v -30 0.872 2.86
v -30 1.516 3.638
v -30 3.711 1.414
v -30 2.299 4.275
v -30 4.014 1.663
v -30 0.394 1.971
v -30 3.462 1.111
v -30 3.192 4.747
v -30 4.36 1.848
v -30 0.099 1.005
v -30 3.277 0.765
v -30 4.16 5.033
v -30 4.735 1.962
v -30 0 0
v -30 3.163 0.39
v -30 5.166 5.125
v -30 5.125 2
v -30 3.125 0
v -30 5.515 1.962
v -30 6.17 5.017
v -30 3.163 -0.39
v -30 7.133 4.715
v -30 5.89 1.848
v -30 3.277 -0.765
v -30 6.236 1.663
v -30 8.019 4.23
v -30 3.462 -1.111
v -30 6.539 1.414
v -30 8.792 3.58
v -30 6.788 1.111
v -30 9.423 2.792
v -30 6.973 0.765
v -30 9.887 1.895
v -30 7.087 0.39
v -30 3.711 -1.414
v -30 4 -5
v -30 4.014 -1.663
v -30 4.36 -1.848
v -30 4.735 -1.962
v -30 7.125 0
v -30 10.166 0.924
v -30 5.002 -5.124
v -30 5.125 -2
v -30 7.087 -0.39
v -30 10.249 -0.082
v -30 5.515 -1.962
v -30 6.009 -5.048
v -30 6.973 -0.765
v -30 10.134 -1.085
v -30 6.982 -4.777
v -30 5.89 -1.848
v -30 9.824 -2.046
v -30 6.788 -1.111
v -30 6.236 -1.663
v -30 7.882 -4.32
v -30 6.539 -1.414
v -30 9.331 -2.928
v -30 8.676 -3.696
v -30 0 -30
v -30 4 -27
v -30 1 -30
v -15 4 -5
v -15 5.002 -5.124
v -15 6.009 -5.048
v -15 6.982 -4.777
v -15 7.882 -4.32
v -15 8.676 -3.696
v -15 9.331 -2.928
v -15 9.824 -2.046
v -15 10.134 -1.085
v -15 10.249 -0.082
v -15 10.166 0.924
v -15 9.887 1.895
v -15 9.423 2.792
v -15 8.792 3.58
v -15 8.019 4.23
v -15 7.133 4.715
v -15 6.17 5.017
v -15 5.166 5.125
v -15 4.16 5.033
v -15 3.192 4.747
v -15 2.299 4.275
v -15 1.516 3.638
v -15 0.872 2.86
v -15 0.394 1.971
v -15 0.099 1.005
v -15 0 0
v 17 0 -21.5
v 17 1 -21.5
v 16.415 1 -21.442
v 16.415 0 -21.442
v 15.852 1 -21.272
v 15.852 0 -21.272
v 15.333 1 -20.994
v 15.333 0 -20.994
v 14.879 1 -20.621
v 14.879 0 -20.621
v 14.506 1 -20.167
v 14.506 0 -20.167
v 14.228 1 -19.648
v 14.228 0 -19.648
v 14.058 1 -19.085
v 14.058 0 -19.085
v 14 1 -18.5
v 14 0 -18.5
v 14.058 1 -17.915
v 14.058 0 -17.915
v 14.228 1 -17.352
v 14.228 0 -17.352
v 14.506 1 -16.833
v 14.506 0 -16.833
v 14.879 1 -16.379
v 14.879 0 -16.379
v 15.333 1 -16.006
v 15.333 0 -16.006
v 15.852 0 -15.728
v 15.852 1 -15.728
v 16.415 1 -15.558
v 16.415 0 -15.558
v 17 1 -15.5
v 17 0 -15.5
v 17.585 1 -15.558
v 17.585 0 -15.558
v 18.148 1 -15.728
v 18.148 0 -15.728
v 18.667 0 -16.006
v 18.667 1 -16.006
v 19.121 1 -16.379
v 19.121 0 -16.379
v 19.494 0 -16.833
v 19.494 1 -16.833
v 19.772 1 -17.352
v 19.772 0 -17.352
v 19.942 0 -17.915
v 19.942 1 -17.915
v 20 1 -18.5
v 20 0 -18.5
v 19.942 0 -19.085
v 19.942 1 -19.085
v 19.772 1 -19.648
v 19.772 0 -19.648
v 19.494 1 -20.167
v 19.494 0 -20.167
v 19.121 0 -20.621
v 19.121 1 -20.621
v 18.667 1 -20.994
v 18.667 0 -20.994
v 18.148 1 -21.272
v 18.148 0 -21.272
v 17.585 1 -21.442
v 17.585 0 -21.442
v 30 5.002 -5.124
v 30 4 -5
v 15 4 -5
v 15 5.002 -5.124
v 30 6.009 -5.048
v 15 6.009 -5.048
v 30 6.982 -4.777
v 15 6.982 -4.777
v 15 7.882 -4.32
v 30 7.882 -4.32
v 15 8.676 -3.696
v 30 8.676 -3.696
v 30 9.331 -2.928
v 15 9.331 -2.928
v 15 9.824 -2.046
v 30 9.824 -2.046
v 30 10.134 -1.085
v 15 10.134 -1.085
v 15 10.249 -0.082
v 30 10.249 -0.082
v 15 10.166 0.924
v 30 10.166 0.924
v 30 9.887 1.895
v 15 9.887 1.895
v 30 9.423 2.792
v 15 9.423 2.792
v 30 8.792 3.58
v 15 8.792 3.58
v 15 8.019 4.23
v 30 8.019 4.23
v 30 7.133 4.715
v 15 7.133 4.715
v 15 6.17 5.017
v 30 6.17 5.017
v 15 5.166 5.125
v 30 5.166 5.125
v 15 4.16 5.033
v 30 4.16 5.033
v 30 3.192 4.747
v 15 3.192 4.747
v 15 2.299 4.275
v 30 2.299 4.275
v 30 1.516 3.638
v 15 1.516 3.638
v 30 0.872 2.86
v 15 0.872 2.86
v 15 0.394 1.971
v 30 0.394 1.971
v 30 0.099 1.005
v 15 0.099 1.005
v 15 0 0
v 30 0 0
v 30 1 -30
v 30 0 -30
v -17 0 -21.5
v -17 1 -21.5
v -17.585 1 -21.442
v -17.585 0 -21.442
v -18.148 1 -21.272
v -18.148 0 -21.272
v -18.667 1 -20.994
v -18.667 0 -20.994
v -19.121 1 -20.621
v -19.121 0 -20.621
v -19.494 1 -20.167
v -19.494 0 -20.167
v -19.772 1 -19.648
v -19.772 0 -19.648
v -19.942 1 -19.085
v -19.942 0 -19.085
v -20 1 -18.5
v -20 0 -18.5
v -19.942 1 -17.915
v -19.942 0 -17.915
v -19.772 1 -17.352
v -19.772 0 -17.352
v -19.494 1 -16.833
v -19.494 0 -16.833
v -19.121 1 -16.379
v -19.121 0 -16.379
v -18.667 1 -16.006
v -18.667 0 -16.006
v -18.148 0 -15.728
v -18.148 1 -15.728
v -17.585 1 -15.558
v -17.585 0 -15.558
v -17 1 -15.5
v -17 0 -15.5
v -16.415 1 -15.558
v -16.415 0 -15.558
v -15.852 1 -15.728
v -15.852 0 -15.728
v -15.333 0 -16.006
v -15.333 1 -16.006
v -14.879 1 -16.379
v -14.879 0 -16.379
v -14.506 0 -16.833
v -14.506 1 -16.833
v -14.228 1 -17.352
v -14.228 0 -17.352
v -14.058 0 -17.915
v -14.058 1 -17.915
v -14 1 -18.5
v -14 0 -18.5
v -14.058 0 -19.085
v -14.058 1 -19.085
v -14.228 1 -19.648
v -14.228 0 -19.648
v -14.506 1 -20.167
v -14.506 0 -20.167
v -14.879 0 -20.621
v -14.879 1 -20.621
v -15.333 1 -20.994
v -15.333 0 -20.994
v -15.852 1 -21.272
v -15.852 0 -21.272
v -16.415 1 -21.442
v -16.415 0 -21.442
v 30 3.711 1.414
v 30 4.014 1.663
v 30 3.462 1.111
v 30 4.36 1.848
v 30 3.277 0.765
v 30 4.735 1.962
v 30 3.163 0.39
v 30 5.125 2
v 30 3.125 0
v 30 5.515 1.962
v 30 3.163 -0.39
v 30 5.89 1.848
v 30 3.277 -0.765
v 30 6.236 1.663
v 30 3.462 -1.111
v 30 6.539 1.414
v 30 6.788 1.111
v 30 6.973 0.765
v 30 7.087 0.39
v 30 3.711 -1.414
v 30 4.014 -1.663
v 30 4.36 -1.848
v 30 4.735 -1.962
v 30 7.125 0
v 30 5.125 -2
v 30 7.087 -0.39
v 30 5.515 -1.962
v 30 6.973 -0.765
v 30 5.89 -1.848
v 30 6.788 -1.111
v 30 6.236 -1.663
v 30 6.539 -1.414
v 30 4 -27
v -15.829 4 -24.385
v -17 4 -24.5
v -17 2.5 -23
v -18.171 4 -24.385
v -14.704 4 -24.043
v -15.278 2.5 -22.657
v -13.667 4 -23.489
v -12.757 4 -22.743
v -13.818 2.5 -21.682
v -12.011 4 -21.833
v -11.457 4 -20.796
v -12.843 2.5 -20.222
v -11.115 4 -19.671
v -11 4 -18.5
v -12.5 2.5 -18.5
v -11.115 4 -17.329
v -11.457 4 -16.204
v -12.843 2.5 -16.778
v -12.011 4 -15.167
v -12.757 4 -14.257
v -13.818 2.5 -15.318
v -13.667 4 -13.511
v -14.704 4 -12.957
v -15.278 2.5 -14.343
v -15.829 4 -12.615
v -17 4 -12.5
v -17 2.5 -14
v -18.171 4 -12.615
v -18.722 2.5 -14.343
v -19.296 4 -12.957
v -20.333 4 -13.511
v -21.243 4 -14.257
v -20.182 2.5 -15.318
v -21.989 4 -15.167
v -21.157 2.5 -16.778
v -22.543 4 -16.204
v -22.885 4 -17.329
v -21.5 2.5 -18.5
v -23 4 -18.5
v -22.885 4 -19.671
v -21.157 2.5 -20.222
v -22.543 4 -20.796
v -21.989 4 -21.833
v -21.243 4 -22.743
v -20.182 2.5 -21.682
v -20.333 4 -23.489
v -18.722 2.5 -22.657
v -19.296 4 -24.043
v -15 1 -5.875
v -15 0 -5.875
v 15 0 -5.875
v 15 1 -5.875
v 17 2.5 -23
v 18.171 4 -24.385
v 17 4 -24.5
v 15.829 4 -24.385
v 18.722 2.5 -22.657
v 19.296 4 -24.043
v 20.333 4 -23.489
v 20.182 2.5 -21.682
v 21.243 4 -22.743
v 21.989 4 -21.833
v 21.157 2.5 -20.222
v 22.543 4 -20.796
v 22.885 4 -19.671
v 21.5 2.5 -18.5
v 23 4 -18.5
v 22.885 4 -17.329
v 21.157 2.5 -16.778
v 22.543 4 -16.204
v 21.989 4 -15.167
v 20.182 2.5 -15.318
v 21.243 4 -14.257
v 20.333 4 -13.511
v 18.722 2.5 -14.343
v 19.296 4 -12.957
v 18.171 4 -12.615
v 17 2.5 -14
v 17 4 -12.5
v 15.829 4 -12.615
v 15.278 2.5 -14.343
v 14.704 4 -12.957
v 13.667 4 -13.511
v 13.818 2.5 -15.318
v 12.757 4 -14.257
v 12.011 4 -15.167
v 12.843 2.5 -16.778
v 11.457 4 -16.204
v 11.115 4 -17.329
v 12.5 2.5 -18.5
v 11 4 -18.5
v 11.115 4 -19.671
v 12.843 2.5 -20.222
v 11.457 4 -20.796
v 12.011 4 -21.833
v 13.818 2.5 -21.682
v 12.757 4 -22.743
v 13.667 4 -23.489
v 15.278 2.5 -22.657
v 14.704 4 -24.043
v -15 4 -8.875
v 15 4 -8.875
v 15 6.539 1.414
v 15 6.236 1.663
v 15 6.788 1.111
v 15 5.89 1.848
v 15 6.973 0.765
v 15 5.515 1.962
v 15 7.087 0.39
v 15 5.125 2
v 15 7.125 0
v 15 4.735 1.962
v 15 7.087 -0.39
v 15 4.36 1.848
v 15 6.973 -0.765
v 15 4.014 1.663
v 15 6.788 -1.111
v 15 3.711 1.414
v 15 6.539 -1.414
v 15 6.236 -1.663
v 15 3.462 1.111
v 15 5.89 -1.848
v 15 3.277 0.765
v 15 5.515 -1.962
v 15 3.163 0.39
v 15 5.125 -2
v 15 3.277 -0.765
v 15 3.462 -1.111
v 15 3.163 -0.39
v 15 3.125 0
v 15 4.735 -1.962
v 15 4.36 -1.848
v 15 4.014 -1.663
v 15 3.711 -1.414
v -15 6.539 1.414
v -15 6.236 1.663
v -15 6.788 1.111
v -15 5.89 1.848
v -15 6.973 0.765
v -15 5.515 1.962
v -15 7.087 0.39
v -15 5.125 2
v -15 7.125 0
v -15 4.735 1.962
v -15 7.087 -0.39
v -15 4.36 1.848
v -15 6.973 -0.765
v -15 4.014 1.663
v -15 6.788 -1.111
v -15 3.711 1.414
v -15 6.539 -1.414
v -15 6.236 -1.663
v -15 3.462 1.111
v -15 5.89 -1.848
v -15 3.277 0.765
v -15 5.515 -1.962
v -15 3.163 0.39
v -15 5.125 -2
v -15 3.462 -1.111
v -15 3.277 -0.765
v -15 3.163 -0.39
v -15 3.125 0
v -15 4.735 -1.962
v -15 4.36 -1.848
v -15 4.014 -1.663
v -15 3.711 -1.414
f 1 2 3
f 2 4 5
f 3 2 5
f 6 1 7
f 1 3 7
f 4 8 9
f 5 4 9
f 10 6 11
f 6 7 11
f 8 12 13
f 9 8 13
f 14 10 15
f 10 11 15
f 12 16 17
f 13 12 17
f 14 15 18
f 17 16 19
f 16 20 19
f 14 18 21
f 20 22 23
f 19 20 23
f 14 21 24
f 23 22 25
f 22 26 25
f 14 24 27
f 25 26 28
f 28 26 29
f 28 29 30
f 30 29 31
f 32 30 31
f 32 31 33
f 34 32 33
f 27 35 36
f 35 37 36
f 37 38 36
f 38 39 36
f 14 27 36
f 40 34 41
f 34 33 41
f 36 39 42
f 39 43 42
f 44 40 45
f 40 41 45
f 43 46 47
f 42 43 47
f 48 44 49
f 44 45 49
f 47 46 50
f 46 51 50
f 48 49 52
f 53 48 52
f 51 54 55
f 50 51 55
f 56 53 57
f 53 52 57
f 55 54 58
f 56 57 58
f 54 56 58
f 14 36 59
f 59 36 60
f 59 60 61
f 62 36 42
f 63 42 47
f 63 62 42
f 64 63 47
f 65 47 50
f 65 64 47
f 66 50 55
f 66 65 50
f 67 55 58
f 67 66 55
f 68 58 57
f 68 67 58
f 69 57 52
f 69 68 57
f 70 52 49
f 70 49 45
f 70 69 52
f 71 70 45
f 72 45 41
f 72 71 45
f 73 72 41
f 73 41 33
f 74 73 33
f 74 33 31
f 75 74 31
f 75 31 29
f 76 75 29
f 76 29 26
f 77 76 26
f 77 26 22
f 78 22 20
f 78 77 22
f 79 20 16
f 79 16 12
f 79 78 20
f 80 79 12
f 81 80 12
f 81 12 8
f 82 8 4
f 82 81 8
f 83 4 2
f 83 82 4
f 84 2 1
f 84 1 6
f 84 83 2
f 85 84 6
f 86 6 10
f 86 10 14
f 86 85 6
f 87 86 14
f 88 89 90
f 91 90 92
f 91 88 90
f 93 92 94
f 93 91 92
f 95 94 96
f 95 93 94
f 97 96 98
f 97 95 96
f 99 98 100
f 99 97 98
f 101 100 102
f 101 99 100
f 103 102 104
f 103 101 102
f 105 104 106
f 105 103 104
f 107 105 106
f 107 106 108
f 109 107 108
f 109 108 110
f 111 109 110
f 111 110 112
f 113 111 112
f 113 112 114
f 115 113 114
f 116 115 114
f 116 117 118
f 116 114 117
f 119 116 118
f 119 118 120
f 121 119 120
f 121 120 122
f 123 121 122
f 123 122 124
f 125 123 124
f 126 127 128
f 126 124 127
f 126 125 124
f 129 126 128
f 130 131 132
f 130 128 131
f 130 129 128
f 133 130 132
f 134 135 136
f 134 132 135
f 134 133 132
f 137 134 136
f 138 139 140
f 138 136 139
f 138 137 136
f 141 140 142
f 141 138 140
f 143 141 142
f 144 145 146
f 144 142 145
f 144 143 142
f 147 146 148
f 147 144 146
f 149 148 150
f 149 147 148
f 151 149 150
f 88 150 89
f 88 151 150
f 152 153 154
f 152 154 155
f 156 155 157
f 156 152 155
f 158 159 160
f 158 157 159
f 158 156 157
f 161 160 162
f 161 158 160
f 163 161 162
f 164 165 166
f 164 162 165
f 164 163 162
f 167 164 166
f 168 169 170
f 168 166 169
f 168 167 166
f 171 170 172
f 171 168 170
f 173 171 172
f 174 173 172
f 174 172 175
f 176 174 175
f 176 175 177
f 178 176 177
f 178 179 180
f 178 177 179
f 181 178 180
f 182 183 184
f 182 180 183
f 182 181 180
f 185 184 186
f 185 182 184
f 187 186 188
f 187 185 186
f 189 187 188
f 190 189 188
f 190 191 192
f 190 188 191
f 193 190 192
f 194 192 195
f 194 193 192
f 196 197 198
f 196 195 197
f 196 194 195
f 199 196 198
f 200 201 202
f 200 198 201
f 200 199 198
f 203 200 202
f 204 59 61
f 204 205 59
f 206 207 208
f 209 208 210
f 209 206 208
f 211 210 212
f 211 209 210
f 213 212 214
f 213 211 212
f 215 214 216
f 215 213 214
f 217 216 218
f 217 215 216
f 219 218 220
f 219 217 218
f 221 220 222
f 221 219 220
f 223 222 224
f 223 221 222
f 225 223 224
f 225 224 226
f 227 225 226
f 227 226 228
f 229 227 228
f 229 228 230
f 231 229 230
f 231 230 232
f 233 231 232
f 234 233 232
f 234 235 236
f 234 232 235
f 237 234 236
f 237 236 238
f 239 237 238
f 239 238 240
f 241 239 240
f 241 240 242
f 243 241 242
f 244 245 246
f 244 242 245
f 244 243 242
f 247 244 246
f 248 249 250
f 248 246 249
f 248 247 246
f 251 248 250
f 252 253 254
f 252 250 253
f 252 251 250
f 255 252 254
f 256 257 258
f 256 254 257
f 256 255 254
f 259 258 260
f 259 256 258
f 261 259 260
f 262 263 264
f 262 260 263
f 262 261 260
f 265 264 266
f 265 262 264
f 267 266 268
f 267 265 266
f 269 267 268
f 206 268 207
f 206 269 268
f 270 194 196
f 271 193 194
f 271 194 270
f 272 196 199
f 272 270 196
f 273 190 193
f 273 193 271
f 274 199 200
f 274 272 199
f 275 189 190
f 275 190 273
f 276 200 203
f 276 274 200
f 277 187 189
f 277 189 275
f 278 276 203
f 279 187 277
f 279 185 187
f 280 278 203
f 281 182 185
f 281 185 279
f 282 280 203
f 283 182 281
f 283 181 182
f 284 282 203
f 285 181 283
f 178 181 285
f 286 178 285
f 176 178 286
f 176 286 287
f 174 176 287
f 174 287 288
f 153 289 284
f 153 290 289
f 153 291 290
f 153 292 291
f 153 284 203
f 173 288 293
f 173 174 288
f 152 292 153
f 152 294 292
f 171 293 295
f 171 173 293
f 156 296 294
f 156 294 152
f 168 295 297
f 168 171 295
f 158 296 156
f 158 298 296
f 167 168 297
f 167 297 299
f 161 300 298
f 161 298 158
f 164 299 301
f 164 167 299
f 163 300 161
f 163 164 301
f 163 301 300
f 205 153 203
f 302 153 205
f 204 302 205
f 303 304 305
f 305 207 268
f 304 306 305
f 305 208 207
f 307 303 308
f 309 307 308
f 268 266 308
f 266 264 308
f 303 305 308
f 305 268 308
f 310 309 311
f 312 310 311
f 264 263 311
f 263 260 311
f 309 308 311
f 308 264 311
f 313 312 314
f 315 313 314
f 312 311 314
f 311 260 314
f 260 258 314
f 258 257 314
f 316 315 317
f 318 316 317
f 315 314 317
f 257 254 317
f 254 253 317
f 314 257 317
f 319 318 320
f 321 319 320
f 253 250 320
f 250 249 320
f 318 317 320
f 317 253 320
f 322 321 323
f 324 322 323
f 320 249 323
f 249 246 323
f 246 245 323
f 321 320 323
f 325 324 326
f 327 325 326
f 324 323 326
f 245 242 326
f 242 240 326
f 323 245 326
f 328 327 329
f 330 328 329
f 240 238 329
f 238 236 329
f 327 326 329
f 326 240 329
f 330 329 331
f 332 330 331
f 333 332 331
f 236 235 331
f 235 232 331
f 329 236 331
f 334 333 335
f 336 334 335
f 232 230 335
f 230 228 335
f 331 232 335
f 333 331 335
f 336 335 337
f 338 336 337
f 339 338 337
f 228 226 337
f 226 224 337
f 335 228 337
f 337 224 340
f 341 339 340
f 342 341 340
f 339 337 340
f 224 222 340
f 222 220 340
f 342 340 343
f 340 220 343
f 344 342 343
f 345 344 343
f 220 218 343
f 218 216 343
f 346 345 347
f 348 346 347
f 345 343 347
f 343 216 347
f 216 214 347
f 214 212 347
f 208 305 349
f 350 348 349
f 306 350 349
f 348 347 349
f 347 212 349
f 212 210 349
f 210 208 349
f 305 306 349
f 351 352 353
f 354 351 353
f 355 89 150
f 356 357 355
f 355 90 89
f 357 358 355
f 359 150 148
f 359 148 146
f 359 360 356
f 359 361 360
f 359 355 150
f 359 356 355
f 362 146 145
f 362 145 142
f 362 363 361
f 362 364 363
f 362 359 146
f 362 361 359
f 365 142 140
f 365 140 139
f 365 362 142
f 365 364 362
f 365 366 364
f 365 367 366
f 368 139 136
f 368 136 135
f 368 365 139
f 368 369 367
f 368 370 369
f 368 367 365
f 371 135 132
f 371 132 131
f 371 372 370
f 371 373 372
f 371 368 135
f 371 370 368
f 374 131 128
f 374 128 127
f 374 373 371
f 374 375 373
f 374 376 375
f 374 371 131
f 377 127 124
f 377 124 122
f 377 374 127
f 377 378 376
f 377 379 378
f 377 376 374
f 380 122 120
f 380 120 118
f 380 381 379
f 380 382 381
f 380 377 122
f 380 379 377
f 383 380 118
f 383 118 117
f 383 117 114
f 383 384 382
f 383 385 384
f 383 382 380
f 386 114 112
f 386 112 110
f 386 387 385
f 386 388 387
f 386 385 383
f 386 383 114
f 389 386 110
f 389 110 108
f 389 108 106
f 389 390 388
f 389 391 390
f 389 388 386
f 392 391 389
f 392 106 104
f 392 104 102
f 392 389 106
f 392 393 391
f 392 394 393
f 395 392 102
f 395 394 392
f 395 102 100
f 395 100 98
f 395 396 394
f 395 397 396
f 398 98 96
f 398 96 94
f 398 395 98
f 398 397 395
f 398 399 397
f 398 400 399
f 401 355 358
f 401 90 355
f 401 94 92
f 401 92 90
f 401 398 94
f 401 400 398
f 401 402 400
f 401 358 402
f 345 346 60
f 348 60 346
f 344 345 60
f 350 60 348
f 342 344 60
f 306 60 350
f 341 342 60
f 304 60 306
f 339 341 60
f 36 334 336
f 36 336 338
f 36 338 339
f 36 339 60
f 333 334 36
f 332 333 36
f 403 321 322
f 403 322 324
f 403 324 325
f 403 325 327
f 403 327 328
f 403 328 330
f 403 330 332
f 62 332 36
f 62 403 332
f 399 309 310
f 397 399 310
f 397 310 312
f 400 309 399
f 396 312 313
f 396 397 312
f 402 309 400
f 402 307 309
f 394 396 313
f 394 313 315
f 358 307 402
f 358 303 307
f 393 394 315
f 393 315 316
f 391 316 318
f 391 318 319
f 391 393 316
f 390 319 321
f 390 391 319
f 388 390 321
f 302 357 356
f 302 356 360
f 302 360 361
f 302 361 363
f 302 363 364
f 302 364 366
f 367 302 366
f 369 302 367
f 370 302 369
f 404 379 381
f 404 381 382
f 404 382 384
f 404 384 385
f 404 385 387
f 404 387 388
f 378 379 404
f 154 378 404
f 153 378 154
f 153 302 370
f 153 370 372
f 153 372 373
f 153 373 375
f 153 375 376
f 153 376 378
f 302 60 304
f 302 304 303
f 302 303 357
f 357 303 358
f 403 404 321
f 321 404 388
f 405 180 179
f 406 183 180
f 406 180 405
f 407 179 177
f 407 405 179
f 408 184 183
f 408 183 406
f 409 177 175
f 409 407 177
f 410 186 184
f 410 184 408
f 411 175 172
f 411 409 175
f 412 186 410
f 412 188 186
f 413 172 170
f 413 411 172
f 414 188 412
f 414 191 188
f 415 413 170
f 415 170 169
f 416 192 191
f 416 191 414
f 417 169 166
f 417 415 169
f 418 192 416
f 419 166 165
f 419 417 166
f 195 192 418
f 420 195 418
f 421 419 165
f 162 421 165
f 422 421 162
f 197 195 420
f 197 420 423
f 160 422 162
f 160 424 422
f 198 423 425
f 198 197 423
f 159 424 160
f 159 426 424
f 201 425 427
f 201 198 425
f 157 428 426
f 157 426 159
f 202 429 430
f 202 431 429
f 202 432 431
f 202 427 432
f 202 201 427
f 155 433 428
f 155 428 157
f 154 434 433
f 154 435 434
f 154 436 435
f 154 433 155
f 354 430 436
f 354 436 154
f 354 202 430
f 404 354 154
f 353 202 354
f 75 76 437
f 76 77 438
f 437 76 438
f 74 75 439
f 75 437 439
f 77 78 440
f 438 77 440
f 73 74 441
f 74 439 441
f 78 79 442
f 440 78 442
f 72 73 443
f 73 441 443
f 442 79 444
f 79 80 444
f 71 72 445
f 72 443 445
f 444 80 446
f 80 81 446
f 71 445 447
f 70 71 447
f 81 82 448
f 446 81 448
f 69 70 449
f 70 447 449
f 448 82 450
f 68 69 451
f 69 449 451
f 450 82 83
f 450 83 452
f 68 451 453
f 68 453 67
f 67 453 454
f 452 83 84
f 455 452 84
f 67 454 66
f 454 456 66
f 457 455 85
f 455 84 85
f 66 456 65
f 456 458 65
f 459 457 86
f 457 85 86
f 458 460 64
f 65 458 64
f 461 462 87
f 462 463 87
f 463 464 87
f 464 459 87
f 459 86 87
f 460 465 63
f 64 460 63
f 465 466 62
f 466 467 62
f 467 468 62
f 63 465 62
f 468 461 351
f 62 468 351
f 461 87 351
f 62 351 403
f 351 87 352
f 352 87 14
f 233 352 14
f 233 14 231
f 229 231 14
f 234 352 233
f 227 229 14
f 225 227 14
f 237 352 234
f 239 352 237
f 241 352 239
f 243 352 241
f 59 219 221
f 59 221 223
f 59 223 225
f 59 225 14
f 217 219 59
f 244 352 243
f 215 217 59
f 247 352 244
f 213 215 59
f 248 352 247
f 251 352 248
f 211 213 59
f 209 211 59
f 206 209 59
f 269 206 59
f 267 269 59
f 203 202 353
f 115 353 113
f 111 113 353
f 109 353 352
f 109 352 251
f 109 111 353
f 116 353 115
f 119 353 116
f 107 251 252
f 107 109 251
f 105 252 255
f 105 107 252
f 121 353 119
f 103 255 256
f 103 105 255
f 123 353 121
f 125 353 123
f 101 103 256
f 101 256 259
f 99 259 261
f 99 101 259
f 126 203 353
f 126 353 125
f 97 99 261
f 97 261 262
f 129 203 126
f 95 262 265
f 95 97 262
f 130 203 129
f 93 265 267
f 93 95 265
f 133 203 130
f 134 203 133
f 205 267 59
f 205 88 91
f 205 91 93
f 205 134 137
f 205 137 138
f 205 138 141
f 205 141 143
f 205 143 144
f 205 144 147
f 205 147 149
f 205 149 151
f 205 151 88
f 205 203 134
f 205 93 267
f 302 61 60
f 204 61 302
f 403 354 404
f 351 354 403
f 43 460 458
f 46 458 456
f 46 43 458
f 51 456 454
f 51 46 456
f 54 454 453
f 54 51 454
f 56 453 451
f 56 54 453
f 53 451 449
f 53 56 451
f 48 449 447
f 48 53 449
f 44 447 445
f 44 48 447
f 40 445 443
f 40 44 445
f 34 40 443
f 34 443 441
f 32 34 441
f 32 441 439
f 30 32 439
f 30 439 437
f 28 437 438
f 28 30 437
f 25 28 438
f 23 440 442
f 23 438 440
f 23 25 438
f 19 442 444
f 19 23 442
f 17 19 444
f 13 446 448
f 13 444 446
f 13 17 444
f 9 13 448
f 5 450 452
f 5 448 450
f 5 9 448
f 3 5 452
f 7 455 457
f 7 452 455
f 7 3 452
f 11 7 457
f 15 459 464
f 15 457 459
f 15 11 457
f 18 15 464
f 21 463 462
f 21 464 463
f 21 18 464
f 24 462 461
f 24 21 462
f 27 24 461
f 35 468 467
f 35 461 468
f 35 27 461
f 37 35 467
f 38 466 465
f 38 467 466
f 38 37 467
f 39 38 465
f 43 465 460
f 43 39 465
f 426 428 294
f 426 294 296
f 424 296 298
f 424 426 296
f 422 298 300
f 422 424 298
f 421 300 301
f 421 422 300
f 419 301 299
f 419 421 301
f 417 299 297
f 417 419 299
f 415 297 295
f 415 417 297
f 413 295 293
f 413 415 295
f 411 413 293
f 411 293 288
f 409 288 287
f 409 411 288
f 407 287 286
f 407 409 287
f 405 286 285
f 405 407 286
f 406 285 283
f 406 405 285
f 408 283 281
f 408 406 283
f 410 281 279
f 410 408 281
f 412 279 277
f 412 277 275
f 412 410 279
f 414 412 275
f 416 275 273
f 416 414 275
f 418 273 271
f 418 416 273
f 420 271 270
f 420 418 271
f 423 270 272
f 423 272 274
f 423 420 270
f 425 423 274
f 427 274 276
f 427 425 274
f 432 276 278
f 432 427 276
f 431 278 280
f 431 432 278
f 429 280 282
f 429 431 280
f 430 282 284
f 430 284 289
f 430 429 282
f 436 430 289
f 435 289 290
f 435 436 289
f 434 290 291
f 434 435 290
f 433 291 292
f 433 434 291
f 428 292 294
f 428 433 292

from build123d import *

# Parameters (mm, degrees)
SKETCH_1_R          = 2
EXTRUDE_1_DEPTH     = 30
SKETCH_2_R          = 3
SKETCH_2_W          = 30
SKETCH_2_H          = 11
CUT_EXTRUDE_1_DEPTH = 44.647021662
CHAMFER_1_SIZE      = 3


with BuildPart() as part:
    # 草图1 → 凸台-拉伸1 (new, symmetric)
    with BuildSketch(Plane(origin=(0, 0, 0), x_dir=(0, 0, -1), z_dir=(1, 0, 0))):
        with BuildLine():
            Line((0, 0), (30, 0))
            Line((30, 0), (30, 4))
            Line((30, 4), (5, 4))
            ThreePointArc((5, 4), (-3.201562119, 9.126952648), (0, 0))
        make_face()
        with Locations((0, 5.125)):
            Circle(SKETCH_1_R, mode=Mode.SUBTRACT)
    extrude(amount=EXTRUDE_1_DEPTH, both=True)

    # 草图2 → 切除-拉伸1 (cut, through all)
    with BuildSketch(Plane(origin=(0, 0, 0), x_dir=(1, 0, 0), z_dir=(0, 1, 0))):
        with Locations(Location((-17, 18.5, 0), (0, 0, 90))):
            Circle(SKETCH_2_R)
        with Locations(Location((17, 18.5, 0), (0, 0, 90))):
            Circle(SKETCH_2_R)
        with Locations((0, 0.375)):
            Rectangle(SKETCH_2_W, SKETCH_2_H)
    extrude(amount=CUT_EXTRUDE_1_DEPTH, mode=Mode.SUBTRACT)

    # 倒角1
    chamfer_1_edges = [part.edges().sort_by_distance(p)[0] for p in [
        (0, 4, -5.875),
        (17, 4, -15.5),
        (-17, 4, -15.5),
        (0, 4, -30),
    ]]
    chamfer(chamfer_1_edges, length=CHAMFER_1_SIZE)


solid = part.part
